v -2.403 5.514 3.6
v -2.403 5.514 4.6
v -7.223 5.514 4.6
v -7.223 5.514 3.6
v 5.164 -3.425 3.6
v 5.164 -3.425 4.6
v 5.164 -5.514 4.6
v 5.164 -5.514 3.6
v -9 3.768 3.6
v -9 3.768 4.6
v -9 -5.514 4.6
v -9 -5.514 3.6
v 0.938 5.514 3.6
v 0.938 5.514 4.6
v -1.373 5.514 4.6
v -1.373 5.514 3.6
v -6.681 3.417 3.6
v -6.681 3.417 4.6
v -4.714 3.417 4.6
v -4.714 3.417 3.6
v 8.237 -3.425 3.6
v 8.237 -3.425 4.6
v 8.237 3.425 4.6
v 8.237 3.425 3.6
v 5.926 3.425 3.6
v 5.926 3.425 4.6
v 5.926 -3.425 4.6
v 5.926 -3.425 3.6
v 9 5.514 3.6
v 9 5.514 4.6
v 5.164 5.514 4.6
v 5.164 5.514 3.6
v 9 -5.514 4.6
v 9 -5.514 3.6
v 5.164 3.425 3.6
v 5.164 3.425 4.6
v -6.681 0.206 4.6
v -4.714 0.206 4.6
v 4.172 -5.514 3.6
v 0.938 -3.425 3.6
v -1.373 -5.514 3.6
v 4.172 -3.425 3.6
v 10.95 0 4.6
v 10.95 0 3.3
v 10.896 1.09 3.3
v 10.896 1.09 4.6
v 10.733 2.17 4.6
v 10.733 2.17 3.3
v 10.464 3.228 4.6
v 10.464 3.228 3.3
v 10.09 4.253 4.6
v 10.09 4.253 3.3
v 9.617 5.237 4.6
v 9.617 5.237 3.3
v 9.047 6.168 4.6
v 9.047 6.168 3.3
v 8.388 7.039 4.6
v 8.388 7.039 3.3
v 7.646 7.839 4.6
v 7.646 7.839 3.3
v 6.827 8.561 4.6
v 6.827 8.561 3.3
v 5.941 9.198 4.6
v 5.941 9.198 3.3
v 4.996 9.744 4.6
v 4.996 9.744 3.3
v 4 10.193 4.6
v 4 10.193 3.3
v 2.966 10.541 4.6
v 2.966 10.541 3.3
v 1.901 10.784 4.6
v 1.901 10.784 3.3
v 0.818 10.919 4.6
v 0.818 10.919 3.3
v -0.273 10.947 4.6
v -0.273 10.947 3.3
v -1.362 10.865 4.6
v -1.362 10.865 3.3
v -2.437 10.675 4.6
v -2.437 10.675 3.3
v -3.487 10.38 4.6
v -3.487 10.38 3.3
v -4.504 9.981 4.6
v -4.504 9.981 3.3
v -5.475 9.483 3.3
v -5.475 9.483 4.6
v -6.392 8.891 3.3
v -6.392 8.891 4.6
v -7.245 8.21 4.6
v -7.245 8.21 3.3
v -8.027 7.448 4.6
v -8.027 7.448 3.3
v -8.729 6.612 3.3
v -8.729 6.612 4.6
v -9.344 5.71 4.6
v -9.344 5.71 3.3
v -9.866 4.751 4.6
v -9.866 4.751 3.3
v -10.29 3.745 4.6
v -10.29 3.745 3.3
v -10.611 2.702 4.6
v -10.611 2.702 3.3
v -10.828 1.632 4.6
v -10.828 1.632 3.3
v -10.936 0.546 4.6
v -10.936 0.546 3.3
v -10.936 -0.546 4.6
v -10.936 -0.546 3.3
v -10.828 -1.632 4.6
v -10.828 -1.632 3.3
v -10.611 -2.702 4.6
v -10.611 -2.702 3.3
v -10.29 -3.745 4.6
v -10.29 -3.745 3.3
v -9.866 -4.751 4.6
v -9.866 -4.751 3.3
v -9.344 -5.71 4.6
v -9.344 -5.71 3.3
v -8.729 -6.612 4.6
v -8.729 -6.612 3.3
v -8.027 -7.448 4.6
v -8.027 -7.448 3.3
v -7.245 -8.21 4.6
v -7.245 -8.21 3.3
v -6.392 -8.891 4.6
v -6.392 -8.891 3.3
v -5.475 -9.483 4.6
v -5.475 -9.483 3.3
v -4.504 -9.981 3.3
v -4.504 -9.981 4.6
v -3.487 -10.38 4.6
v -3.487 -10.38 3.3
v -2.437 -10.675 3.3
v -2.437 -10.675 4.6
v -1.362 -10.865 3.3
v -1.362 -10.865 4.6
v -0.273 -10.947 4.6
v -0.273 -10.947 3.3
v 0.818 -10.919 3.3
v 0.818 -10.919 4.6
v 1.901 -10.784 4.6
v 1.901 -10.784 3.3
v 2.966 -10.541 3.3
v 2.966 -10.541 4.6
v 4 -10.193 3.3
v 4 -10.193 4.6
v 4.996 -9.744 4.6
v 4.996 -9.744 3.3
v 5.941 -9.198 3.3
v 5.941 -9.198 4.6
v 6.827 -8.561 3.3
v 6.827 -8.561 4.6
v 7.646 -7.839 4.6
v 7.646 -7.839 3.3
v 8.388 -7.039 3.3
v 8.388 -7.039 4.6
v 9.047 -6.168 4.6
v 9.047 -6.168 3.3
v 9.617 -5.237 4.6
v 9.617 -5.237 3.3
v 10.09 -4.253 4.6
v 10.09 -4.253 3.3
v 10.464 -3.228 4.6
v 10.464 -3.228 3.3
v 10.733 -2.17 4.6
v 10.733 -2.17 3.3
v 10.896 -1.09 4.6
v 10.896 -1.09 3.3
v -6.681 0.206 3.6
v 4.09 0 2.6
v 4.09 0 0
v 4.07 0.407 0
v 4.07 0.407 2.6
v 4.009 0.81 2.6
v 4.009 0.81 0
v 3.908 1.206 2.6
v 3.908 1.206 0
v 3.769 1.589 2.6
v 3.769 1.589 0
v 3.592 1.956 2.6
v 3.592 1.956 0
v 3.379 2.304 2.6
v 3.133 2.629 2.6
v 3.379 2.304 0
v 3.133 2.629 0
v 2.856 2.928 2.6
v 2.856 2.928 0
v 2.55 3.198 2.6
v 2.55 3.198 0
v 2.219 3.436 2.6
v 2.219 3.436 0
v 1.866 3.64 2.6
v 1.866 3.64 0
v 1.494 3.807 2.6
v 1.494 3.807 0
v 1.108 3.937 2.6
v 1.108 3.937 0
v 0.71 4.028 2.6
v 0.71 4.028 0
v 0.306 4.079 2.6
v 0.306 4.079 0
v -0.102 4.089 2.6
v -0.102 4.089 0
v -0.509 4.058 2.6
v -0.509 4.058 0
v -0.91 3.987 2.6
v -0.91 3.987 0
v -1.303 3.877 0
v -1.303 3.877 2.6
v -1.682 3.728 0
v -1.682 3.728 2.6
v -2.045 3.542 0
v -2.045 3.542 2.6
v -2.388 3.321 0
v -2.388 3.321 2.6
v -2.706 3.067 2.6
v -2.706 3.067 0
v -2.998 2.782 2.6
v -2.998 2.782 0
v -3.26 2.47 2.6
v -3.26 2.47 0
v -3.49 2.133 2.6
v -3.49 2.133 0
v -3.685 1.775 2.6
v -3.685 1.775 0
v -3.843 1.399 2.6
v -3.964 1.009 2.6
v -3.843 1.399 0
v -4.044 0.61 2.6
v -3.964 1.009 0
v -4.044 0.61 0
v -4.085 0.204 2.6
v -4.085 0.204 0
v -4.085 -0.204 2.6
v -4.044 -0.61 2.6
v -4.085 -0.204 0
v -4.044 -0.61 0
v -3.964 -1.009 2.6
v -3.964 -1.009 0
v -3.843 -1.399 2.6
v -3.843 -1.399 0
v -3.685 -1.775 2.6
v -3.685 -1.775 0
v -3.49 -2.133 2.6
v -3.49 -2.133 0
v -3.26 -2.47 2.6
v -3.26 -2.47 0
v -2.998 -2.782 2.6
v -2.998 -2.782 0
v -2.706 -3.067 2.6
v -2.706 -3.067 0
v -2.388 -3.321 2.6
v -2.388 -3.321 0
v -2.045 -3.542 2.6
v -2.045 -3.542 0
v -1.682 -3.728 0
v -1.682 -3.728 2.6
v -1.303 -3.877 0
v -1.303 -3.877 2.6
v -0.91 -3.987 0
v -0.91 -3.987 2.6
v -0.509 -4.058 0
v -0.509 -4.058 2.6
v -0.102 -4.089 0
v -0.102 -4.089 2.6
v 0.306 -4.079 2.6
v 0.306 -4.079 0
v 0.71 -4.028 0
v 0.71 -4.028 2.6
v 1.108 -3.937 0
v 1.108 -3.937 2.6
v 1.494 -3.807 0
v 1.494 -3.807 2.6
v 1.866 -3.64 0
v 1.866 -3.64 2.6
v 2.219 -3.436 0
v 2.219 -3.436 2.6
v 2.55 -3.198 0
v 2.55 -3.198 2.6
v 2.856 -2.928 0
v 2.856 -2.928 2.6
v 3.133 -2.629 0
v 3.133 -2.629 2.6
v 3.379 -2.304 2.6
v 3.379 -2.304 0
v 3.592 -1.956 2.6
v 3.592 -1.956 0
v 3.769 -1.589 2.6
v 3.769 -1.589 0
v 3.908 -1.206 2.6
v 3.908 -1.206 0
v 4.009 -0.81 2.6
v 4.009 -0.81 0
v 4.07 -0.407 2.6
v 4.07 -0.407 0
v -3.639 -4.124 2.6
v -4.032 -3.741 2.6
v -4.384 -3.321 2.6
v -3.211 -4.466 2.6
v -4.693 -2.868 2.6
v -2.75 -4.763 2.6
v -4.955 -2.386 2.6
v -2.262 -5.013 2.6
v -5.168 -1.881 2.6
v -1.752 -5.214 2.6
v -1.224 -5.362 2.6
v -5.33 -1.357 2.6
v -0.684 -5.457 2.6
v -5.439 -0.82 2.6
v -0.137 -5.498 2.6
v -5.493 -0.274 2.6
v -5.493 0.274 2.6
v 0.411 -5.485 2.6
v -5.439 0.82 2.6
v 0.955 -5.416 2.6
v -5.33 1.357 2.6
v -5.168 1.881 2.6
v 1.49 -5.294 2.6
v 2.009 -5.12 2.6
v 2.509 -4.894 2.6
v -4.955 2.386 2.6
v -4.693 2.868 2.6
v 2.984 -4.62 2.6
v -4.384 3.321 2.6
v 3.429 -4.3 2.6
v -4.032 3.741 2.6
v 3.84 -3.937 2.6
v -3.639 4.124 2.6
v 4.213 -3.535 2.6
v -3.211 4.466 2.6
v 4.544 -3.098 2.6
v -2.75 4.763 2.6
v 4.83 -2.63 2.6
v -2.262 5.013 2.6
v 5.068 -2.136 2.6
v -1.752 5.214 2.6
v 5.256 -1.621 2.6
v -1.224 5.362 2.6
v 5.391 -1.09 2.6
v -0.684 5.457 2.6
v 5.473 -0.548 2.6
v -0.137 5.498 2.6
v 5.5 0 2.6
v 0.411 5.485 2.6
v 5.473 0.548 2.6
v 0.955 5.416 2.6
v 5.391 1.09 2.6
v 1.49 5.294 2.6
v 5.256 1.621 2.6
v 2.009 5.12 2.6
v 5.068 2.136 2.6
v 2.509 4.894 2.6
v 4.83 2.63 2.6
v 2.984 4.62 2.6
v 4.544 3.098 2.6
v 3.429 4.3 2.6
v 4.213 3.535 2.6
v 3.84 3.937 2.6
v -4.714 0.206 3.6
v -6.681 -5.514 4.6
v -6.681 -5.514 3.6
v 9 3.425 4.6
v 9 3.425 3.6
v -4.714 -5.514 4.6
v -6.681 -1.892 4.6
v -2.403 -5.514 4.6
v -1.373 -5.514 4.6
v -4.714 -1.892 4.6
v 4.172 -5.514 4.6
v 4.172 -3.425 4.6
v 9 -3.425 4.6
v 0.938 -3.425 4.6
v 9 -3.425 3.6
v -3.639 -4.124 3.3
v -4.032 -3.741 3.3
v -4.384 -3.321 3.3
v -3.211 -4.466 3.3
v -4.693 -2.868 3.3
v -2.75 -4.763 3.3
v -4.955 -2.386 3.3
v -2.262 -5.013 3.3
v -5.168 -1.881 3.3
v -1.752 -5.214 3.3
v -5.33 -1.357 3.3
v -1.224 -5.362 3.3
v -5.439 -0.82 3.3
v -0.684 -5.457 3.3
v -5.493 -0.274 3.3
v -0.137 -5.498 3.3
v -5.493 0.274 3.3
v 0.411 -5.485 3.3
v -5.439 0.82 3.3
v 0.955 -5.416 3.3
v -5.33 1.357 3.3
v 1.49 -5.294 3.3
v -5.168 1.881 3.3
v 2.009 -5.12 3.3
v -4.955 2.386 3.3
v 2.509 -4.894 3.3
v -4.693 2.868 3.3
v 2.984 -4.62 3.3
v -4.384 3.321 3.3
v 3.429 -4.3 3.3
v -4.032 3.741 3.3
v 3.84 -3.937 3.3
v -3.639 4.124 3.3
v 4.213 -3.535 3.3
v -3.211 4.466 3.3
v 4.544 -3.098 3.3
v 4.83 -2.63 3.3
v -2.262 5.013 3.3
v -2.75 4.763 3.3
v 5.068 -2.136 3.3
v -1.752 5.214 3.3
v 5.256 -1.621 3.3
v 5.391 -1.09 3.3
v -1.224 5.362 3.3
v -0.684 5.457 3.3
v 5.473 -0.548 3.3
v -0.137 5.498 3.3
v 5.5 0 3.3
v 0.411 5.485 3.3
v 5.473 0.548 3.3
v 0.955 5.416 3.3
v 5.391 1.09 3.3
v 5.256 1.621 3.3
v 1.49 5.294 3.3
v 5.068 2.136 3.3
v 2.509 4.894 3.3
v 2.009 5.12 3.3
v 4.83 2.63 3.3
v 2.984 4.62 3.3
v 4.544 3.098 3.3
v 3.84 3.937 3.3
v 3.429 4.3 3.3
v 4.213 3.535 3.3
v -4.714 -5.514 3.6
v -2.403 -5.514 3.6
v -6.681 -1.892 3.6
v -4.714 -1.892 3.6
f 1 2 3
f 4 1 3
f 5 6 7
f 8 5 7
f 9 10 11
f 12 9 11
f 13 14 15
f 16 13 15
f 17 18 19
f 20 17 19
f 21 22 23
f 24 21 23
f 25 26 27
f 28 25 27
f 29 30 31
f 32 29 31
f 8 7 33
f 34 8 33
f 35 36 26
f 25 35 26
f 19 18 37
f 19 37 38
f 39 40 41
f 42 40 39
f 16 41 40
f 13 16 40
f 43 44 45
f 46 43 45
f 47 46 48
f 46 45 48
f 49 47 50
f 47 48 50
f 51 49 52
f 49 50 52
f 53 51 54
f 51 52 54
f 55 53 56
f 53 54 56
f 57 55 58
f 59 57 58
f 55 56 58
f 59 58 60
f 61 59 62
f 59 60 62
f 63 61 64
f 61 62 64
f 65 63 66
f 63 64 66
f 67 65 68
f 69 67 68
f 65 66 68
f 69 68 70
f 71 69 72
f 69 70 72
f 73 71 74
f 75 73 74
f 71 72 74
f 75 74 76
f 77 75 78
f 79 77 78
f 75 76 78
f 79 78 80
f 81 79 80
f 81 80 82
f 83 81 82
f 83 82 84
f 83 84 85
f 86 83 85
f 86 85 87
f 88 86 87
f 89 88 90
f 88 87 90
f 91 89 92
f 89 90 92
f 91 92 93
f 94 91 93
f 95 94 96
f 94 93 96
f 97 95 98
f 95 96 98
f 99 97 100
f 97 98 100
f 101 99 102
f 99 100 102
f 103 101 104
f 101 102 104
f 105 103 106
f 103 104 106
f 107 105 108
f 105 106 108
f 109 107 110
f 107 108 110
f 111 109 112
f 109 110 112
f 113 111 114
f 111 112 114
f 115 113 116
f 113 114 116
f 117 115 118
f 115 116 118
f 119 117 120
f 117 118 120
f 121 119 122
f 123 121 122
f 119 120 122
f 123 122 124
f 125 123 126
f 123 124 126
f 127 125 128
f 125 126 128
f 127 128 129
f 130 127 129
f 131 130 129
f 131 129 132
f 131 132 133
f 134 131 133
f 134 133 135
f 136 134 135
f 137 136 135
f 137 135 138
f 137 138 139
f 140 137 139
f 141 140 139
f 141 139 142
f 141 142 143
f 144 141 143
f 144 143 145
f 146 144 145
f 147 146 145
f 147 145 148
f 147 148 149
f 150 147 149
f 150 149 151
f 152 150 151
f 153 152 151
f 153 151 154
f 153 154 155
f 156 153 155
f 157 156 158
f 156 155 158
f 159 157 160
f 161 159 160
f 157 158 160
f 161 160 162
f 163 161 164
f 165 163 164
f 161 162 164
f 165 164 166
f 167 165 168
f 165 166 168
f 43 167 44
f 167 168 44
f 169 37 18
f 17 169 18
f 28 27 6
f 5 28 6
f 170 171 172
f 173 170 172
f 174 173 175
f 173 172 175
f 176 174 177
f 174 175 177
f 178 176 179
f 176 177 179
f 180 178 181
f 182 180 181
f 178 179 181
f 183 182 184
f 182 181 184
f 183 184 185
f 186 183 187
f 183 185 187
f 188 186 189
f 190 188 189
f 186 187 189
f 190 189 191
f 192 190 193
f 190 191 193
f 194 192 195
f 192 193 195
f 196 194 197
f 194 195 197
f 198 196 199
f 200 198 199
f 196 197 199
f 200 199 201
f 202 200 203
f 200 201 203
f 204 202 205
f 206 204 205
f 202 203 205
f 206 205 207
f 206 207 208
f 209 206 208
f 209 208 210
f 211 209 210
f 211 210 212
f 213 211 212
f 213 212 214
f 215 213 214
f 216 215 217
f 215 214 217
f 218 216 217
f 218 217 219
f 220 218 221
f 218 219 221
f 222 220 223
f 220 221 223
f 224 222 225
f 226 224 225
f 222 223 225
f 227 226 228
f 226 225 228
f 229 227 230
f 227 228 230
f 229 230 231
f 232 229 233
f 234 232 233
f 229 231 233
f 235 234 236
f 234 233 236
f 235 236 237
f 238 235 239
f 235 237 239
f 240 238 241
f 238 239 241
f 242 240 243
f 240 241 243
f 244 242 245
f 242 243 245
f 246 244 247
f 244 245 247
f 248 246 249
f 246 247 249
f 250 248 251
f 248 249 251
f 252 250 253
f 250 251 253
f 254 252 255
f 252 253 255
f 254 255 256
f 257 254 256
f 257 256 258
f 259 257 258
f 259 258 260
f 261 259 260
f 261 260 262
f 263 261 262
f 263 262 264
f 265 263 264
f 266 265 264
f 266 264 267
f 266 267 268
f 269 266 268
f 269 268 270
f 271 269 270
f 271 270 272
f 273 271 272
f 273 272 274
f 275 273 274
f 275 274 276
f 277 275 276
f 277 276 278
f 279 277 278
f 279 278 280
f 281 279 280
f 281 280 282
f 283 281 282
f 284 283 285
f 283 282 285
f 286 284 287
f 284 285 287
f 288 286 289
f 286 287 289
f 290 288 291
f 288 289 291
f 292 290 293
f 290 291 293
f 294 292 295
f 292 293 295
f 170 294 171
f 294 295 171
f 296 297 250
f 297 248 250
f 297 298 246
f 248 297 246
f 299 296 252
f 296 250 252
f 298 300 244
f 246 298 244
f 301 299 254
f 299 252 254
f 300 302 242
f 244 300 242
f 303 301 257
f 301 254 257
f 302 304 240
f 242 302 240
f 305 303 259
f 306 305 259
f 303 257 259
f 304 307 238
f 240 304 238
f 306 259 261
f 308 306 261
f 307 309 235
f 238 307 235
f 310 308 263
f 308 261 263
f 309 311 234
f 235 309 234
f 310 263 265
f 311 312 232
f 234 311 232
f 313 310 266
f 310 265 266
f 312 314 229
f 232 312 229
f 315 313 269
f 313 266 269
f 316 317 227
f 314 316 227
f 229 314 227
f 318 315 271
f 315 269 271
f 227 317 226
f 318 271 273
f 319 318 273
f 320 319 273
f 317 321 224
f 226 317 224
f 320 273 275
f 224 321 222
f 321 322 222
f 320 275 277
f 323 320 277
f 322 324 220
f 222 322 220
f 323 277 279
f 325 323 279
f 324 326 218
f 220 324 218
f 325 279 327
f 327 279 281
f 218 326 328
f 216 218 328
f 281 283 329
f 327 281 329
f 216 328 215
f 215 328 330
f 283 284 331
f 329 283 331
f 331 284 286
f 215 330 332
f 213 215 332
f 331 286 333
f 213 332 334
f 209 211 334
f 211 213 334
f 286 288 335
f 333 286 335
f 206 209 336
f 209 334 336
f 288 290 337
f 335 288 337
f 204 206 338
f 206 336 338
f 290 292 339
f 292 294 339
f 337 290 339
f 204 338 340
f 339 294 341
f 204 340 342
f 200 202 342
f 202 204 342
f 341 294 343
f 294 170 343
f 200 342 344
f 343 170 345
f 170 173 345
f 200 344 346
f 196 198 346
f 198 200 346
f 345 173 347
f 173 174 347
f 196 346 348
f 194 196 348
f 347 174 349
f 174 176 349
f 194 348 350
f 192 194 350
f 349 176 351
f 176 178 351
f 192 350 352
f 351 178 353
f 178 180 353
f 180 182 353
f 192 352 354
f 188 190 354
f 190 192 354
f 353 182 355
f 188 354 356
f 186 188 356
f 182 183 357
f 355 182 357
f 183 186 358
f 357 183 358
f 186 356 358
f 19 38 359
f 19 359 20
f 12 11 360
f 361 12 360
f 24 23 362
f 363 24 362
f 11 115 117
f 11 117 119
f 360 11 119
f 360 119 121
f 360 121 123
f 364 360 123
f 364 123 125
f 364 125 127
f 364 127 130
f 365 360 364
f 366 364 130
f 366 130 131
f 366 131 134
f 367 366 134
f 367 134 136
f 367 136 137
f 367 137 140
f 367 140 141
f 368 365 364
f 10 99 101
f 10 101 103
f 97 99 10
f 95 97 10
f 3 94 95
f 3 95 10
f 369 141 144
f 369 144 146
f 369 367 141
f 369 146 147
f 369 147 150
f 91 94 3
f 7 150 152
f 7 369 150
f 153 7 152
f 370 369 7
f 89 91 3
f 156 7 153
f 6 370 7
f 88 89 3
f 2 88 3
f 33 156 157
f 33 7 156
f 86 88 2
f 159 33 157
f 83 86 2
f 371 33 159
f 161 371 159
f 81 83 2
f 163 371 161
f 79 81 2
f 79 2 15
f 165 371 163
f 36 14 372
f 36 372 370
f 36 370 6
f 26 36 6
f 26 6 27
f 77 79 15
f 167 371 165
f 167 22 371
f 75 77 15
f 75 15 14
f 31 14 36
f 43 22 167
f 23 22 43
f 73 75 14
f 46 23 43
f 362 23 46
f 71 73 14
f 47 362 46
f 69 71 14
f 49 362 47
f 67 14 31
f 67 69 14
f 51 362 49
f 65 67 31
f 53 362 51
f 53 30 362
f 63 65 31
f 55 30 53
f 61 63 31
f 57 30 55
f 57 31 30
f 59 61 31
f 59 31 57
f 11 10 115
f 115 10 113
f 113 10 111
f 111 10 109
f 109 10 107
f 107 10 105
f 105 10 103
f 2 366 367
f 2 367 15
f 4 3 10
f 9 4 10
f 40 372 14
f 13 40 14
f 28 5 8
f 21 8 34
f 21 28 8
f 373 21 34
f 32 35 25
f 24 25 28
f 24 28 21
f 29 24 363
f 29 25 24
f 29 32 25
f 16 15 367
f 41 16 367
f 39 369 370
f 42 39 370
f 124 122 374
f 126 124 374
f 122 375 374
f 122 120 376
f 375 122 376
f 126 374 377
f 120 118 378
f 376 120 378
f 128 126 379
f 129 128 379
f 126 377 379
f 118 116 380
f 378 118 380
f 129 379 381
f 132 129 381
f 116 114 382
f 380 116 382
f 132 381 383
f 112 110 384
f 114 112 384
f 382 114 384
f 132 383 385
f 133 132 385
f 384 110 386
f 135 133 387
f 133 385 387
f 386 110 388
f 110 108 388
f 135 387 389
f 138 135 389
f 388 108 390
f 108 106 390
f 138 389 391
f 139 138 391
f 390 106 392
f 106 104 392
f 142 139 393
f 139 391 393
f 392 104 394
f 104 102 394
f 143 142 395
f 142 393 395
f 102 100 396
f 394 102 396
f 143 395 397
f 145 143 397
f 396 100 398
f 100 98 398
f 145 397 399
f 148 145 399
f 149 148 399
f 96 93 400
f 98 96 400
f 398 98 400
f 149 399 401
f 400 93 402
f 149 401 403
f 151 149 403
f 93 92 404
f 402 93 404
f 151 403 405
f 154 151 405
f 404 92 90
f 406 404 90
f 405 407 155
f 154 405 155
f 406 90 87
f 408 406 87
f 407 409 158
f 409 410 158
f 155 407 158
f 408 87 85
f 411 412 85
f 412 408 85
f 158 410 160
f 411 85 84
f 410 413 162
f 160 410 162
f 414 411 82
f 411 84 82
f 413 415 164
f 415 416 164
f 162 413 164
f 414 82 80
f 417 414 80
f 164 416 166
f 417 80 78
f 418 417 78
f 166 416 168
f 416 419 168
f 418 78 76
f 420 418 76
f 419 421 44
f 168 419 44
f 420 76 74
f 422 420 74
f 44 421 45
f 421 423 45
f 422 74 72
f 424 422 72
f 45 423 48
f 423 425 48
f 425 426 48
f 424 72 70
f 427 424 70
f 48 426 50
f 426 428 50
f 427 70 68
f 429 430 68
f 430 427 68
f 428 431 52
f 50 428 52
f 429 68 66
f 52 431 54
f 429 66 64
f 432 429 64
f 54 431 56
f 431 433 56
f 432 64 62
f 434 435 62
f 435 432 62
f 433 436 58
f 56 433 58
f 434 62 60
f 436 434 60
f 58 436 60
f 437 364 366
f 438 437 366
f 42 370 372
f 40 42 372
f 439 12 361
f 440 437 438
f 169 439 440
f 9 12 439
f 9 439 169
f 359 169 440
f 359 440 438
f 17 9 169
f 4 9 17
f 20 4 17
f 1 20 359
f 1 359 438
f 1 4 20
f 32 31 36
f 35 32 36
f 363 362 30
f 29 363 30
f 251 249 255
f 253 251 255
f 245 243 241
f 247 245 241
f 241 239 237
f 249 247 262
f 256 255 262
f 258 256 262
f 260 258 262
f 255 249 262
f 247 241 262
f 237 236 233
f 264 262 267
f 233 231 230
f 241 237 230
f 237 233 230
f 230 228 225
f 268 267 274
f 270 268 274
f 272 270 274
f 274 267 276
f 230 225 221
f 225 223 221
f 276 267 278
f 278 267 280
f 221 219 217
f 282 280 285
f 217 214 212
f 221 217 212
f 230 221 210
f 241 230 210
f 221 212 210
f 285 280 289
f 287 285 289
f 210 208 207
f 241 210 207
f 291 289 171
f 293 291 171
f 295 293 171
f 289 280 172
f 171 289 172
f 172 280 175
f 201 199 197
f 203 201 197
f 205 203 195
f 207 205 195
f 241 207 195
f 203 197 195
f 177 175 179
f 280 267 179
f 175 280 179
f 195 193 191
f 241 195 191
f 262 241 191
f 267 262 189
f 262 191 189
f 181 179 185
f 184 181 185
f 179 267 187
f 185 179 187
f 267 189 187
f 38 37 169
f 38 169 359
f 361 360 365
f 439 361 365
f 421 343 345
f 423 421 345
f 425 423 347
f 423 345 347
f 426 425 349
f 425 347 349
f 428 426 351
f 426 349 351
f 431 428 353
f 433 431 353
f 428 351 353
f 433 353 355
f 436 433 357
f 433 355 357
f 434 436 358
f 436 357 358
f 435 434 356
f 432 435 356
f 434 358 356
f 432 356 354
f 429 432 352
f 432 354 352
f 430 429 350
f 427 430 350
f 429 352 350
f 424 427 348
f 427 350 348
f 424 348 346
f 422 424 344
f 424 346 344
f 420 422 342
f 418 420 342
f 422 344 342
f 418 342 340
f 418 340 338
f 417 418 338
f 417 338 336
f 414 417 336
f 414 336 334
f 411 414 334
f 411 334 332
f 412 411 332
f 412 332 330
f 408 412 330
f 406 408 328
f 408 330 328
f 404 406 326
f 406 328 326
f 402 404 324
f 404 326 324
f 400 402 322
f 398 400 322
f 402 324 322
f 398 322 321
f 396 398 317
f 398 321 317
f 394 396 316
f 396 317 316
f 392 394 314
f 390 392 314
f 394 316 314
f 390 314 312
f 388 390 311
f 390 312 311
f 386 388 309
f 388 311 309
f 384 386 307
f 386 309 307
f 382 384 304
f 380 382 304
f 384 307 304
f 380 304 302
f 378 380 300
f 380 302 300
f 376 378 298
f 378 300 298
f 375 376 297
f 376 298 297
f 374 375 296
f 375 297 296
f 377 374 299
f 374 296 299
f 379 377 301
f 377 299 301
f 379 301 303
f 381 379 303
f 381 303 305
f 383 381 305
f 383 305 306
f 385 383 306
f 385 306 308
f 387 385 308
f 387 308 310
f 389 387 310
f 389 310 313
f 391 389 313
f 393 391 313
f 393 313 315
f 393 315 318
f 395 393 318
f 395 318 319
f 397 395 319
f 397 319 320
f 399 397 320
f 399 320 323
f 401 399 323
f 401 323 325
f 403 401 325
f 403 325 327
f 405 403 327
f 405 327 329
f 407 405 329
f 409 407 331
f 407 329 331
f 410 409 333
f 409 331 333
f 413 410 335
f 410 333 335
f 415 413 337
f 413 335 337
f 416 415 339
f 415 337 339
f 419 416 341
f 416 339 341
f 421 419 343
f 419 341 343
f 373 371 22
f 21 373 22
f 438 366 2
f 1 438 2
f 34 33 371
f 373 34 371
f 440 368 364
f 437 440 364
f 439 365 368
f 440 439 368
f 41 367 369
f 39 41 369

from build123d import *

# Parameters (mm, degrees)
F0_R     = 4.09
F1_DEPTH = 2.6
F2_R     = 5.5
F3_DEPTH = 0.7
F4_R     = 10.95
F5_DEPTH = 1.3
F6_W     = 1.967797
F6_H     = 3.211017
F7_DEPTH = 1


with BuildPart() as f1:
    # F0 (on Top) → F1 (new body)
    with BuildSketch(Plane.XY):
        Circle(F0_R)
    extrude(amount=F1_DEPTH)

    # F2 (on face) → F3 (join)
    with BuildSketch(Plane.XY.offset(2.6)):
        Circle(F2_R)
    extrude(amount=F3_DEPTH)

    # F4 (on face) → F5 (join)
    with BuildSketch(Plane.XY.offset(3.3)):
        Circle(F4_R)
    extrude(amount=F5_DEPTH)

    # F6 (on face) → F7 (cut)
    with BuildSketch(Plane.XY.offset(4.6)):
        Polygon((-9.000013, -5.514394), (-6.681369, -5.514394), (-6.681369, -1.891513), (-4.713572, -1.891513), (-4.713572, -5.514394), (-2.402555, -5.514394), (-2.402555, 5.514419), (-7.222894, 5.514419), (-9.000013, 3.767809), align=None)
        with Locations((-5.69747, 1.811453)):
            Rectangle(F6_W, F6_H, mode=Mode.SUBTRACT)
        Polygon((-1.372894, 5.514419), (-1.372894, -5.514394), (4.172021, -5.514394), (4.172021, -3.424564), (0.938123, -3.424564), (0.938123, 5.514419), align=None)
        Polygon((8.999987, -5.514394), (8.999987, -3.424564), (8.237275, -3.424564), (8.237275, 3.424589), (8.999987, 3.424589), (8.999987, 5.514419), (5.163547, 5.514419), (5.163547, 3.424589), (5.926259, 3.424589), (5.926259, -3.424564), (5.163547, -3.424564), (5.163547, -5.514394), align=None)
    extrude(amount=-F7_DEPTH, mode=Mode.SUBTRACT)


solid = f1.part
